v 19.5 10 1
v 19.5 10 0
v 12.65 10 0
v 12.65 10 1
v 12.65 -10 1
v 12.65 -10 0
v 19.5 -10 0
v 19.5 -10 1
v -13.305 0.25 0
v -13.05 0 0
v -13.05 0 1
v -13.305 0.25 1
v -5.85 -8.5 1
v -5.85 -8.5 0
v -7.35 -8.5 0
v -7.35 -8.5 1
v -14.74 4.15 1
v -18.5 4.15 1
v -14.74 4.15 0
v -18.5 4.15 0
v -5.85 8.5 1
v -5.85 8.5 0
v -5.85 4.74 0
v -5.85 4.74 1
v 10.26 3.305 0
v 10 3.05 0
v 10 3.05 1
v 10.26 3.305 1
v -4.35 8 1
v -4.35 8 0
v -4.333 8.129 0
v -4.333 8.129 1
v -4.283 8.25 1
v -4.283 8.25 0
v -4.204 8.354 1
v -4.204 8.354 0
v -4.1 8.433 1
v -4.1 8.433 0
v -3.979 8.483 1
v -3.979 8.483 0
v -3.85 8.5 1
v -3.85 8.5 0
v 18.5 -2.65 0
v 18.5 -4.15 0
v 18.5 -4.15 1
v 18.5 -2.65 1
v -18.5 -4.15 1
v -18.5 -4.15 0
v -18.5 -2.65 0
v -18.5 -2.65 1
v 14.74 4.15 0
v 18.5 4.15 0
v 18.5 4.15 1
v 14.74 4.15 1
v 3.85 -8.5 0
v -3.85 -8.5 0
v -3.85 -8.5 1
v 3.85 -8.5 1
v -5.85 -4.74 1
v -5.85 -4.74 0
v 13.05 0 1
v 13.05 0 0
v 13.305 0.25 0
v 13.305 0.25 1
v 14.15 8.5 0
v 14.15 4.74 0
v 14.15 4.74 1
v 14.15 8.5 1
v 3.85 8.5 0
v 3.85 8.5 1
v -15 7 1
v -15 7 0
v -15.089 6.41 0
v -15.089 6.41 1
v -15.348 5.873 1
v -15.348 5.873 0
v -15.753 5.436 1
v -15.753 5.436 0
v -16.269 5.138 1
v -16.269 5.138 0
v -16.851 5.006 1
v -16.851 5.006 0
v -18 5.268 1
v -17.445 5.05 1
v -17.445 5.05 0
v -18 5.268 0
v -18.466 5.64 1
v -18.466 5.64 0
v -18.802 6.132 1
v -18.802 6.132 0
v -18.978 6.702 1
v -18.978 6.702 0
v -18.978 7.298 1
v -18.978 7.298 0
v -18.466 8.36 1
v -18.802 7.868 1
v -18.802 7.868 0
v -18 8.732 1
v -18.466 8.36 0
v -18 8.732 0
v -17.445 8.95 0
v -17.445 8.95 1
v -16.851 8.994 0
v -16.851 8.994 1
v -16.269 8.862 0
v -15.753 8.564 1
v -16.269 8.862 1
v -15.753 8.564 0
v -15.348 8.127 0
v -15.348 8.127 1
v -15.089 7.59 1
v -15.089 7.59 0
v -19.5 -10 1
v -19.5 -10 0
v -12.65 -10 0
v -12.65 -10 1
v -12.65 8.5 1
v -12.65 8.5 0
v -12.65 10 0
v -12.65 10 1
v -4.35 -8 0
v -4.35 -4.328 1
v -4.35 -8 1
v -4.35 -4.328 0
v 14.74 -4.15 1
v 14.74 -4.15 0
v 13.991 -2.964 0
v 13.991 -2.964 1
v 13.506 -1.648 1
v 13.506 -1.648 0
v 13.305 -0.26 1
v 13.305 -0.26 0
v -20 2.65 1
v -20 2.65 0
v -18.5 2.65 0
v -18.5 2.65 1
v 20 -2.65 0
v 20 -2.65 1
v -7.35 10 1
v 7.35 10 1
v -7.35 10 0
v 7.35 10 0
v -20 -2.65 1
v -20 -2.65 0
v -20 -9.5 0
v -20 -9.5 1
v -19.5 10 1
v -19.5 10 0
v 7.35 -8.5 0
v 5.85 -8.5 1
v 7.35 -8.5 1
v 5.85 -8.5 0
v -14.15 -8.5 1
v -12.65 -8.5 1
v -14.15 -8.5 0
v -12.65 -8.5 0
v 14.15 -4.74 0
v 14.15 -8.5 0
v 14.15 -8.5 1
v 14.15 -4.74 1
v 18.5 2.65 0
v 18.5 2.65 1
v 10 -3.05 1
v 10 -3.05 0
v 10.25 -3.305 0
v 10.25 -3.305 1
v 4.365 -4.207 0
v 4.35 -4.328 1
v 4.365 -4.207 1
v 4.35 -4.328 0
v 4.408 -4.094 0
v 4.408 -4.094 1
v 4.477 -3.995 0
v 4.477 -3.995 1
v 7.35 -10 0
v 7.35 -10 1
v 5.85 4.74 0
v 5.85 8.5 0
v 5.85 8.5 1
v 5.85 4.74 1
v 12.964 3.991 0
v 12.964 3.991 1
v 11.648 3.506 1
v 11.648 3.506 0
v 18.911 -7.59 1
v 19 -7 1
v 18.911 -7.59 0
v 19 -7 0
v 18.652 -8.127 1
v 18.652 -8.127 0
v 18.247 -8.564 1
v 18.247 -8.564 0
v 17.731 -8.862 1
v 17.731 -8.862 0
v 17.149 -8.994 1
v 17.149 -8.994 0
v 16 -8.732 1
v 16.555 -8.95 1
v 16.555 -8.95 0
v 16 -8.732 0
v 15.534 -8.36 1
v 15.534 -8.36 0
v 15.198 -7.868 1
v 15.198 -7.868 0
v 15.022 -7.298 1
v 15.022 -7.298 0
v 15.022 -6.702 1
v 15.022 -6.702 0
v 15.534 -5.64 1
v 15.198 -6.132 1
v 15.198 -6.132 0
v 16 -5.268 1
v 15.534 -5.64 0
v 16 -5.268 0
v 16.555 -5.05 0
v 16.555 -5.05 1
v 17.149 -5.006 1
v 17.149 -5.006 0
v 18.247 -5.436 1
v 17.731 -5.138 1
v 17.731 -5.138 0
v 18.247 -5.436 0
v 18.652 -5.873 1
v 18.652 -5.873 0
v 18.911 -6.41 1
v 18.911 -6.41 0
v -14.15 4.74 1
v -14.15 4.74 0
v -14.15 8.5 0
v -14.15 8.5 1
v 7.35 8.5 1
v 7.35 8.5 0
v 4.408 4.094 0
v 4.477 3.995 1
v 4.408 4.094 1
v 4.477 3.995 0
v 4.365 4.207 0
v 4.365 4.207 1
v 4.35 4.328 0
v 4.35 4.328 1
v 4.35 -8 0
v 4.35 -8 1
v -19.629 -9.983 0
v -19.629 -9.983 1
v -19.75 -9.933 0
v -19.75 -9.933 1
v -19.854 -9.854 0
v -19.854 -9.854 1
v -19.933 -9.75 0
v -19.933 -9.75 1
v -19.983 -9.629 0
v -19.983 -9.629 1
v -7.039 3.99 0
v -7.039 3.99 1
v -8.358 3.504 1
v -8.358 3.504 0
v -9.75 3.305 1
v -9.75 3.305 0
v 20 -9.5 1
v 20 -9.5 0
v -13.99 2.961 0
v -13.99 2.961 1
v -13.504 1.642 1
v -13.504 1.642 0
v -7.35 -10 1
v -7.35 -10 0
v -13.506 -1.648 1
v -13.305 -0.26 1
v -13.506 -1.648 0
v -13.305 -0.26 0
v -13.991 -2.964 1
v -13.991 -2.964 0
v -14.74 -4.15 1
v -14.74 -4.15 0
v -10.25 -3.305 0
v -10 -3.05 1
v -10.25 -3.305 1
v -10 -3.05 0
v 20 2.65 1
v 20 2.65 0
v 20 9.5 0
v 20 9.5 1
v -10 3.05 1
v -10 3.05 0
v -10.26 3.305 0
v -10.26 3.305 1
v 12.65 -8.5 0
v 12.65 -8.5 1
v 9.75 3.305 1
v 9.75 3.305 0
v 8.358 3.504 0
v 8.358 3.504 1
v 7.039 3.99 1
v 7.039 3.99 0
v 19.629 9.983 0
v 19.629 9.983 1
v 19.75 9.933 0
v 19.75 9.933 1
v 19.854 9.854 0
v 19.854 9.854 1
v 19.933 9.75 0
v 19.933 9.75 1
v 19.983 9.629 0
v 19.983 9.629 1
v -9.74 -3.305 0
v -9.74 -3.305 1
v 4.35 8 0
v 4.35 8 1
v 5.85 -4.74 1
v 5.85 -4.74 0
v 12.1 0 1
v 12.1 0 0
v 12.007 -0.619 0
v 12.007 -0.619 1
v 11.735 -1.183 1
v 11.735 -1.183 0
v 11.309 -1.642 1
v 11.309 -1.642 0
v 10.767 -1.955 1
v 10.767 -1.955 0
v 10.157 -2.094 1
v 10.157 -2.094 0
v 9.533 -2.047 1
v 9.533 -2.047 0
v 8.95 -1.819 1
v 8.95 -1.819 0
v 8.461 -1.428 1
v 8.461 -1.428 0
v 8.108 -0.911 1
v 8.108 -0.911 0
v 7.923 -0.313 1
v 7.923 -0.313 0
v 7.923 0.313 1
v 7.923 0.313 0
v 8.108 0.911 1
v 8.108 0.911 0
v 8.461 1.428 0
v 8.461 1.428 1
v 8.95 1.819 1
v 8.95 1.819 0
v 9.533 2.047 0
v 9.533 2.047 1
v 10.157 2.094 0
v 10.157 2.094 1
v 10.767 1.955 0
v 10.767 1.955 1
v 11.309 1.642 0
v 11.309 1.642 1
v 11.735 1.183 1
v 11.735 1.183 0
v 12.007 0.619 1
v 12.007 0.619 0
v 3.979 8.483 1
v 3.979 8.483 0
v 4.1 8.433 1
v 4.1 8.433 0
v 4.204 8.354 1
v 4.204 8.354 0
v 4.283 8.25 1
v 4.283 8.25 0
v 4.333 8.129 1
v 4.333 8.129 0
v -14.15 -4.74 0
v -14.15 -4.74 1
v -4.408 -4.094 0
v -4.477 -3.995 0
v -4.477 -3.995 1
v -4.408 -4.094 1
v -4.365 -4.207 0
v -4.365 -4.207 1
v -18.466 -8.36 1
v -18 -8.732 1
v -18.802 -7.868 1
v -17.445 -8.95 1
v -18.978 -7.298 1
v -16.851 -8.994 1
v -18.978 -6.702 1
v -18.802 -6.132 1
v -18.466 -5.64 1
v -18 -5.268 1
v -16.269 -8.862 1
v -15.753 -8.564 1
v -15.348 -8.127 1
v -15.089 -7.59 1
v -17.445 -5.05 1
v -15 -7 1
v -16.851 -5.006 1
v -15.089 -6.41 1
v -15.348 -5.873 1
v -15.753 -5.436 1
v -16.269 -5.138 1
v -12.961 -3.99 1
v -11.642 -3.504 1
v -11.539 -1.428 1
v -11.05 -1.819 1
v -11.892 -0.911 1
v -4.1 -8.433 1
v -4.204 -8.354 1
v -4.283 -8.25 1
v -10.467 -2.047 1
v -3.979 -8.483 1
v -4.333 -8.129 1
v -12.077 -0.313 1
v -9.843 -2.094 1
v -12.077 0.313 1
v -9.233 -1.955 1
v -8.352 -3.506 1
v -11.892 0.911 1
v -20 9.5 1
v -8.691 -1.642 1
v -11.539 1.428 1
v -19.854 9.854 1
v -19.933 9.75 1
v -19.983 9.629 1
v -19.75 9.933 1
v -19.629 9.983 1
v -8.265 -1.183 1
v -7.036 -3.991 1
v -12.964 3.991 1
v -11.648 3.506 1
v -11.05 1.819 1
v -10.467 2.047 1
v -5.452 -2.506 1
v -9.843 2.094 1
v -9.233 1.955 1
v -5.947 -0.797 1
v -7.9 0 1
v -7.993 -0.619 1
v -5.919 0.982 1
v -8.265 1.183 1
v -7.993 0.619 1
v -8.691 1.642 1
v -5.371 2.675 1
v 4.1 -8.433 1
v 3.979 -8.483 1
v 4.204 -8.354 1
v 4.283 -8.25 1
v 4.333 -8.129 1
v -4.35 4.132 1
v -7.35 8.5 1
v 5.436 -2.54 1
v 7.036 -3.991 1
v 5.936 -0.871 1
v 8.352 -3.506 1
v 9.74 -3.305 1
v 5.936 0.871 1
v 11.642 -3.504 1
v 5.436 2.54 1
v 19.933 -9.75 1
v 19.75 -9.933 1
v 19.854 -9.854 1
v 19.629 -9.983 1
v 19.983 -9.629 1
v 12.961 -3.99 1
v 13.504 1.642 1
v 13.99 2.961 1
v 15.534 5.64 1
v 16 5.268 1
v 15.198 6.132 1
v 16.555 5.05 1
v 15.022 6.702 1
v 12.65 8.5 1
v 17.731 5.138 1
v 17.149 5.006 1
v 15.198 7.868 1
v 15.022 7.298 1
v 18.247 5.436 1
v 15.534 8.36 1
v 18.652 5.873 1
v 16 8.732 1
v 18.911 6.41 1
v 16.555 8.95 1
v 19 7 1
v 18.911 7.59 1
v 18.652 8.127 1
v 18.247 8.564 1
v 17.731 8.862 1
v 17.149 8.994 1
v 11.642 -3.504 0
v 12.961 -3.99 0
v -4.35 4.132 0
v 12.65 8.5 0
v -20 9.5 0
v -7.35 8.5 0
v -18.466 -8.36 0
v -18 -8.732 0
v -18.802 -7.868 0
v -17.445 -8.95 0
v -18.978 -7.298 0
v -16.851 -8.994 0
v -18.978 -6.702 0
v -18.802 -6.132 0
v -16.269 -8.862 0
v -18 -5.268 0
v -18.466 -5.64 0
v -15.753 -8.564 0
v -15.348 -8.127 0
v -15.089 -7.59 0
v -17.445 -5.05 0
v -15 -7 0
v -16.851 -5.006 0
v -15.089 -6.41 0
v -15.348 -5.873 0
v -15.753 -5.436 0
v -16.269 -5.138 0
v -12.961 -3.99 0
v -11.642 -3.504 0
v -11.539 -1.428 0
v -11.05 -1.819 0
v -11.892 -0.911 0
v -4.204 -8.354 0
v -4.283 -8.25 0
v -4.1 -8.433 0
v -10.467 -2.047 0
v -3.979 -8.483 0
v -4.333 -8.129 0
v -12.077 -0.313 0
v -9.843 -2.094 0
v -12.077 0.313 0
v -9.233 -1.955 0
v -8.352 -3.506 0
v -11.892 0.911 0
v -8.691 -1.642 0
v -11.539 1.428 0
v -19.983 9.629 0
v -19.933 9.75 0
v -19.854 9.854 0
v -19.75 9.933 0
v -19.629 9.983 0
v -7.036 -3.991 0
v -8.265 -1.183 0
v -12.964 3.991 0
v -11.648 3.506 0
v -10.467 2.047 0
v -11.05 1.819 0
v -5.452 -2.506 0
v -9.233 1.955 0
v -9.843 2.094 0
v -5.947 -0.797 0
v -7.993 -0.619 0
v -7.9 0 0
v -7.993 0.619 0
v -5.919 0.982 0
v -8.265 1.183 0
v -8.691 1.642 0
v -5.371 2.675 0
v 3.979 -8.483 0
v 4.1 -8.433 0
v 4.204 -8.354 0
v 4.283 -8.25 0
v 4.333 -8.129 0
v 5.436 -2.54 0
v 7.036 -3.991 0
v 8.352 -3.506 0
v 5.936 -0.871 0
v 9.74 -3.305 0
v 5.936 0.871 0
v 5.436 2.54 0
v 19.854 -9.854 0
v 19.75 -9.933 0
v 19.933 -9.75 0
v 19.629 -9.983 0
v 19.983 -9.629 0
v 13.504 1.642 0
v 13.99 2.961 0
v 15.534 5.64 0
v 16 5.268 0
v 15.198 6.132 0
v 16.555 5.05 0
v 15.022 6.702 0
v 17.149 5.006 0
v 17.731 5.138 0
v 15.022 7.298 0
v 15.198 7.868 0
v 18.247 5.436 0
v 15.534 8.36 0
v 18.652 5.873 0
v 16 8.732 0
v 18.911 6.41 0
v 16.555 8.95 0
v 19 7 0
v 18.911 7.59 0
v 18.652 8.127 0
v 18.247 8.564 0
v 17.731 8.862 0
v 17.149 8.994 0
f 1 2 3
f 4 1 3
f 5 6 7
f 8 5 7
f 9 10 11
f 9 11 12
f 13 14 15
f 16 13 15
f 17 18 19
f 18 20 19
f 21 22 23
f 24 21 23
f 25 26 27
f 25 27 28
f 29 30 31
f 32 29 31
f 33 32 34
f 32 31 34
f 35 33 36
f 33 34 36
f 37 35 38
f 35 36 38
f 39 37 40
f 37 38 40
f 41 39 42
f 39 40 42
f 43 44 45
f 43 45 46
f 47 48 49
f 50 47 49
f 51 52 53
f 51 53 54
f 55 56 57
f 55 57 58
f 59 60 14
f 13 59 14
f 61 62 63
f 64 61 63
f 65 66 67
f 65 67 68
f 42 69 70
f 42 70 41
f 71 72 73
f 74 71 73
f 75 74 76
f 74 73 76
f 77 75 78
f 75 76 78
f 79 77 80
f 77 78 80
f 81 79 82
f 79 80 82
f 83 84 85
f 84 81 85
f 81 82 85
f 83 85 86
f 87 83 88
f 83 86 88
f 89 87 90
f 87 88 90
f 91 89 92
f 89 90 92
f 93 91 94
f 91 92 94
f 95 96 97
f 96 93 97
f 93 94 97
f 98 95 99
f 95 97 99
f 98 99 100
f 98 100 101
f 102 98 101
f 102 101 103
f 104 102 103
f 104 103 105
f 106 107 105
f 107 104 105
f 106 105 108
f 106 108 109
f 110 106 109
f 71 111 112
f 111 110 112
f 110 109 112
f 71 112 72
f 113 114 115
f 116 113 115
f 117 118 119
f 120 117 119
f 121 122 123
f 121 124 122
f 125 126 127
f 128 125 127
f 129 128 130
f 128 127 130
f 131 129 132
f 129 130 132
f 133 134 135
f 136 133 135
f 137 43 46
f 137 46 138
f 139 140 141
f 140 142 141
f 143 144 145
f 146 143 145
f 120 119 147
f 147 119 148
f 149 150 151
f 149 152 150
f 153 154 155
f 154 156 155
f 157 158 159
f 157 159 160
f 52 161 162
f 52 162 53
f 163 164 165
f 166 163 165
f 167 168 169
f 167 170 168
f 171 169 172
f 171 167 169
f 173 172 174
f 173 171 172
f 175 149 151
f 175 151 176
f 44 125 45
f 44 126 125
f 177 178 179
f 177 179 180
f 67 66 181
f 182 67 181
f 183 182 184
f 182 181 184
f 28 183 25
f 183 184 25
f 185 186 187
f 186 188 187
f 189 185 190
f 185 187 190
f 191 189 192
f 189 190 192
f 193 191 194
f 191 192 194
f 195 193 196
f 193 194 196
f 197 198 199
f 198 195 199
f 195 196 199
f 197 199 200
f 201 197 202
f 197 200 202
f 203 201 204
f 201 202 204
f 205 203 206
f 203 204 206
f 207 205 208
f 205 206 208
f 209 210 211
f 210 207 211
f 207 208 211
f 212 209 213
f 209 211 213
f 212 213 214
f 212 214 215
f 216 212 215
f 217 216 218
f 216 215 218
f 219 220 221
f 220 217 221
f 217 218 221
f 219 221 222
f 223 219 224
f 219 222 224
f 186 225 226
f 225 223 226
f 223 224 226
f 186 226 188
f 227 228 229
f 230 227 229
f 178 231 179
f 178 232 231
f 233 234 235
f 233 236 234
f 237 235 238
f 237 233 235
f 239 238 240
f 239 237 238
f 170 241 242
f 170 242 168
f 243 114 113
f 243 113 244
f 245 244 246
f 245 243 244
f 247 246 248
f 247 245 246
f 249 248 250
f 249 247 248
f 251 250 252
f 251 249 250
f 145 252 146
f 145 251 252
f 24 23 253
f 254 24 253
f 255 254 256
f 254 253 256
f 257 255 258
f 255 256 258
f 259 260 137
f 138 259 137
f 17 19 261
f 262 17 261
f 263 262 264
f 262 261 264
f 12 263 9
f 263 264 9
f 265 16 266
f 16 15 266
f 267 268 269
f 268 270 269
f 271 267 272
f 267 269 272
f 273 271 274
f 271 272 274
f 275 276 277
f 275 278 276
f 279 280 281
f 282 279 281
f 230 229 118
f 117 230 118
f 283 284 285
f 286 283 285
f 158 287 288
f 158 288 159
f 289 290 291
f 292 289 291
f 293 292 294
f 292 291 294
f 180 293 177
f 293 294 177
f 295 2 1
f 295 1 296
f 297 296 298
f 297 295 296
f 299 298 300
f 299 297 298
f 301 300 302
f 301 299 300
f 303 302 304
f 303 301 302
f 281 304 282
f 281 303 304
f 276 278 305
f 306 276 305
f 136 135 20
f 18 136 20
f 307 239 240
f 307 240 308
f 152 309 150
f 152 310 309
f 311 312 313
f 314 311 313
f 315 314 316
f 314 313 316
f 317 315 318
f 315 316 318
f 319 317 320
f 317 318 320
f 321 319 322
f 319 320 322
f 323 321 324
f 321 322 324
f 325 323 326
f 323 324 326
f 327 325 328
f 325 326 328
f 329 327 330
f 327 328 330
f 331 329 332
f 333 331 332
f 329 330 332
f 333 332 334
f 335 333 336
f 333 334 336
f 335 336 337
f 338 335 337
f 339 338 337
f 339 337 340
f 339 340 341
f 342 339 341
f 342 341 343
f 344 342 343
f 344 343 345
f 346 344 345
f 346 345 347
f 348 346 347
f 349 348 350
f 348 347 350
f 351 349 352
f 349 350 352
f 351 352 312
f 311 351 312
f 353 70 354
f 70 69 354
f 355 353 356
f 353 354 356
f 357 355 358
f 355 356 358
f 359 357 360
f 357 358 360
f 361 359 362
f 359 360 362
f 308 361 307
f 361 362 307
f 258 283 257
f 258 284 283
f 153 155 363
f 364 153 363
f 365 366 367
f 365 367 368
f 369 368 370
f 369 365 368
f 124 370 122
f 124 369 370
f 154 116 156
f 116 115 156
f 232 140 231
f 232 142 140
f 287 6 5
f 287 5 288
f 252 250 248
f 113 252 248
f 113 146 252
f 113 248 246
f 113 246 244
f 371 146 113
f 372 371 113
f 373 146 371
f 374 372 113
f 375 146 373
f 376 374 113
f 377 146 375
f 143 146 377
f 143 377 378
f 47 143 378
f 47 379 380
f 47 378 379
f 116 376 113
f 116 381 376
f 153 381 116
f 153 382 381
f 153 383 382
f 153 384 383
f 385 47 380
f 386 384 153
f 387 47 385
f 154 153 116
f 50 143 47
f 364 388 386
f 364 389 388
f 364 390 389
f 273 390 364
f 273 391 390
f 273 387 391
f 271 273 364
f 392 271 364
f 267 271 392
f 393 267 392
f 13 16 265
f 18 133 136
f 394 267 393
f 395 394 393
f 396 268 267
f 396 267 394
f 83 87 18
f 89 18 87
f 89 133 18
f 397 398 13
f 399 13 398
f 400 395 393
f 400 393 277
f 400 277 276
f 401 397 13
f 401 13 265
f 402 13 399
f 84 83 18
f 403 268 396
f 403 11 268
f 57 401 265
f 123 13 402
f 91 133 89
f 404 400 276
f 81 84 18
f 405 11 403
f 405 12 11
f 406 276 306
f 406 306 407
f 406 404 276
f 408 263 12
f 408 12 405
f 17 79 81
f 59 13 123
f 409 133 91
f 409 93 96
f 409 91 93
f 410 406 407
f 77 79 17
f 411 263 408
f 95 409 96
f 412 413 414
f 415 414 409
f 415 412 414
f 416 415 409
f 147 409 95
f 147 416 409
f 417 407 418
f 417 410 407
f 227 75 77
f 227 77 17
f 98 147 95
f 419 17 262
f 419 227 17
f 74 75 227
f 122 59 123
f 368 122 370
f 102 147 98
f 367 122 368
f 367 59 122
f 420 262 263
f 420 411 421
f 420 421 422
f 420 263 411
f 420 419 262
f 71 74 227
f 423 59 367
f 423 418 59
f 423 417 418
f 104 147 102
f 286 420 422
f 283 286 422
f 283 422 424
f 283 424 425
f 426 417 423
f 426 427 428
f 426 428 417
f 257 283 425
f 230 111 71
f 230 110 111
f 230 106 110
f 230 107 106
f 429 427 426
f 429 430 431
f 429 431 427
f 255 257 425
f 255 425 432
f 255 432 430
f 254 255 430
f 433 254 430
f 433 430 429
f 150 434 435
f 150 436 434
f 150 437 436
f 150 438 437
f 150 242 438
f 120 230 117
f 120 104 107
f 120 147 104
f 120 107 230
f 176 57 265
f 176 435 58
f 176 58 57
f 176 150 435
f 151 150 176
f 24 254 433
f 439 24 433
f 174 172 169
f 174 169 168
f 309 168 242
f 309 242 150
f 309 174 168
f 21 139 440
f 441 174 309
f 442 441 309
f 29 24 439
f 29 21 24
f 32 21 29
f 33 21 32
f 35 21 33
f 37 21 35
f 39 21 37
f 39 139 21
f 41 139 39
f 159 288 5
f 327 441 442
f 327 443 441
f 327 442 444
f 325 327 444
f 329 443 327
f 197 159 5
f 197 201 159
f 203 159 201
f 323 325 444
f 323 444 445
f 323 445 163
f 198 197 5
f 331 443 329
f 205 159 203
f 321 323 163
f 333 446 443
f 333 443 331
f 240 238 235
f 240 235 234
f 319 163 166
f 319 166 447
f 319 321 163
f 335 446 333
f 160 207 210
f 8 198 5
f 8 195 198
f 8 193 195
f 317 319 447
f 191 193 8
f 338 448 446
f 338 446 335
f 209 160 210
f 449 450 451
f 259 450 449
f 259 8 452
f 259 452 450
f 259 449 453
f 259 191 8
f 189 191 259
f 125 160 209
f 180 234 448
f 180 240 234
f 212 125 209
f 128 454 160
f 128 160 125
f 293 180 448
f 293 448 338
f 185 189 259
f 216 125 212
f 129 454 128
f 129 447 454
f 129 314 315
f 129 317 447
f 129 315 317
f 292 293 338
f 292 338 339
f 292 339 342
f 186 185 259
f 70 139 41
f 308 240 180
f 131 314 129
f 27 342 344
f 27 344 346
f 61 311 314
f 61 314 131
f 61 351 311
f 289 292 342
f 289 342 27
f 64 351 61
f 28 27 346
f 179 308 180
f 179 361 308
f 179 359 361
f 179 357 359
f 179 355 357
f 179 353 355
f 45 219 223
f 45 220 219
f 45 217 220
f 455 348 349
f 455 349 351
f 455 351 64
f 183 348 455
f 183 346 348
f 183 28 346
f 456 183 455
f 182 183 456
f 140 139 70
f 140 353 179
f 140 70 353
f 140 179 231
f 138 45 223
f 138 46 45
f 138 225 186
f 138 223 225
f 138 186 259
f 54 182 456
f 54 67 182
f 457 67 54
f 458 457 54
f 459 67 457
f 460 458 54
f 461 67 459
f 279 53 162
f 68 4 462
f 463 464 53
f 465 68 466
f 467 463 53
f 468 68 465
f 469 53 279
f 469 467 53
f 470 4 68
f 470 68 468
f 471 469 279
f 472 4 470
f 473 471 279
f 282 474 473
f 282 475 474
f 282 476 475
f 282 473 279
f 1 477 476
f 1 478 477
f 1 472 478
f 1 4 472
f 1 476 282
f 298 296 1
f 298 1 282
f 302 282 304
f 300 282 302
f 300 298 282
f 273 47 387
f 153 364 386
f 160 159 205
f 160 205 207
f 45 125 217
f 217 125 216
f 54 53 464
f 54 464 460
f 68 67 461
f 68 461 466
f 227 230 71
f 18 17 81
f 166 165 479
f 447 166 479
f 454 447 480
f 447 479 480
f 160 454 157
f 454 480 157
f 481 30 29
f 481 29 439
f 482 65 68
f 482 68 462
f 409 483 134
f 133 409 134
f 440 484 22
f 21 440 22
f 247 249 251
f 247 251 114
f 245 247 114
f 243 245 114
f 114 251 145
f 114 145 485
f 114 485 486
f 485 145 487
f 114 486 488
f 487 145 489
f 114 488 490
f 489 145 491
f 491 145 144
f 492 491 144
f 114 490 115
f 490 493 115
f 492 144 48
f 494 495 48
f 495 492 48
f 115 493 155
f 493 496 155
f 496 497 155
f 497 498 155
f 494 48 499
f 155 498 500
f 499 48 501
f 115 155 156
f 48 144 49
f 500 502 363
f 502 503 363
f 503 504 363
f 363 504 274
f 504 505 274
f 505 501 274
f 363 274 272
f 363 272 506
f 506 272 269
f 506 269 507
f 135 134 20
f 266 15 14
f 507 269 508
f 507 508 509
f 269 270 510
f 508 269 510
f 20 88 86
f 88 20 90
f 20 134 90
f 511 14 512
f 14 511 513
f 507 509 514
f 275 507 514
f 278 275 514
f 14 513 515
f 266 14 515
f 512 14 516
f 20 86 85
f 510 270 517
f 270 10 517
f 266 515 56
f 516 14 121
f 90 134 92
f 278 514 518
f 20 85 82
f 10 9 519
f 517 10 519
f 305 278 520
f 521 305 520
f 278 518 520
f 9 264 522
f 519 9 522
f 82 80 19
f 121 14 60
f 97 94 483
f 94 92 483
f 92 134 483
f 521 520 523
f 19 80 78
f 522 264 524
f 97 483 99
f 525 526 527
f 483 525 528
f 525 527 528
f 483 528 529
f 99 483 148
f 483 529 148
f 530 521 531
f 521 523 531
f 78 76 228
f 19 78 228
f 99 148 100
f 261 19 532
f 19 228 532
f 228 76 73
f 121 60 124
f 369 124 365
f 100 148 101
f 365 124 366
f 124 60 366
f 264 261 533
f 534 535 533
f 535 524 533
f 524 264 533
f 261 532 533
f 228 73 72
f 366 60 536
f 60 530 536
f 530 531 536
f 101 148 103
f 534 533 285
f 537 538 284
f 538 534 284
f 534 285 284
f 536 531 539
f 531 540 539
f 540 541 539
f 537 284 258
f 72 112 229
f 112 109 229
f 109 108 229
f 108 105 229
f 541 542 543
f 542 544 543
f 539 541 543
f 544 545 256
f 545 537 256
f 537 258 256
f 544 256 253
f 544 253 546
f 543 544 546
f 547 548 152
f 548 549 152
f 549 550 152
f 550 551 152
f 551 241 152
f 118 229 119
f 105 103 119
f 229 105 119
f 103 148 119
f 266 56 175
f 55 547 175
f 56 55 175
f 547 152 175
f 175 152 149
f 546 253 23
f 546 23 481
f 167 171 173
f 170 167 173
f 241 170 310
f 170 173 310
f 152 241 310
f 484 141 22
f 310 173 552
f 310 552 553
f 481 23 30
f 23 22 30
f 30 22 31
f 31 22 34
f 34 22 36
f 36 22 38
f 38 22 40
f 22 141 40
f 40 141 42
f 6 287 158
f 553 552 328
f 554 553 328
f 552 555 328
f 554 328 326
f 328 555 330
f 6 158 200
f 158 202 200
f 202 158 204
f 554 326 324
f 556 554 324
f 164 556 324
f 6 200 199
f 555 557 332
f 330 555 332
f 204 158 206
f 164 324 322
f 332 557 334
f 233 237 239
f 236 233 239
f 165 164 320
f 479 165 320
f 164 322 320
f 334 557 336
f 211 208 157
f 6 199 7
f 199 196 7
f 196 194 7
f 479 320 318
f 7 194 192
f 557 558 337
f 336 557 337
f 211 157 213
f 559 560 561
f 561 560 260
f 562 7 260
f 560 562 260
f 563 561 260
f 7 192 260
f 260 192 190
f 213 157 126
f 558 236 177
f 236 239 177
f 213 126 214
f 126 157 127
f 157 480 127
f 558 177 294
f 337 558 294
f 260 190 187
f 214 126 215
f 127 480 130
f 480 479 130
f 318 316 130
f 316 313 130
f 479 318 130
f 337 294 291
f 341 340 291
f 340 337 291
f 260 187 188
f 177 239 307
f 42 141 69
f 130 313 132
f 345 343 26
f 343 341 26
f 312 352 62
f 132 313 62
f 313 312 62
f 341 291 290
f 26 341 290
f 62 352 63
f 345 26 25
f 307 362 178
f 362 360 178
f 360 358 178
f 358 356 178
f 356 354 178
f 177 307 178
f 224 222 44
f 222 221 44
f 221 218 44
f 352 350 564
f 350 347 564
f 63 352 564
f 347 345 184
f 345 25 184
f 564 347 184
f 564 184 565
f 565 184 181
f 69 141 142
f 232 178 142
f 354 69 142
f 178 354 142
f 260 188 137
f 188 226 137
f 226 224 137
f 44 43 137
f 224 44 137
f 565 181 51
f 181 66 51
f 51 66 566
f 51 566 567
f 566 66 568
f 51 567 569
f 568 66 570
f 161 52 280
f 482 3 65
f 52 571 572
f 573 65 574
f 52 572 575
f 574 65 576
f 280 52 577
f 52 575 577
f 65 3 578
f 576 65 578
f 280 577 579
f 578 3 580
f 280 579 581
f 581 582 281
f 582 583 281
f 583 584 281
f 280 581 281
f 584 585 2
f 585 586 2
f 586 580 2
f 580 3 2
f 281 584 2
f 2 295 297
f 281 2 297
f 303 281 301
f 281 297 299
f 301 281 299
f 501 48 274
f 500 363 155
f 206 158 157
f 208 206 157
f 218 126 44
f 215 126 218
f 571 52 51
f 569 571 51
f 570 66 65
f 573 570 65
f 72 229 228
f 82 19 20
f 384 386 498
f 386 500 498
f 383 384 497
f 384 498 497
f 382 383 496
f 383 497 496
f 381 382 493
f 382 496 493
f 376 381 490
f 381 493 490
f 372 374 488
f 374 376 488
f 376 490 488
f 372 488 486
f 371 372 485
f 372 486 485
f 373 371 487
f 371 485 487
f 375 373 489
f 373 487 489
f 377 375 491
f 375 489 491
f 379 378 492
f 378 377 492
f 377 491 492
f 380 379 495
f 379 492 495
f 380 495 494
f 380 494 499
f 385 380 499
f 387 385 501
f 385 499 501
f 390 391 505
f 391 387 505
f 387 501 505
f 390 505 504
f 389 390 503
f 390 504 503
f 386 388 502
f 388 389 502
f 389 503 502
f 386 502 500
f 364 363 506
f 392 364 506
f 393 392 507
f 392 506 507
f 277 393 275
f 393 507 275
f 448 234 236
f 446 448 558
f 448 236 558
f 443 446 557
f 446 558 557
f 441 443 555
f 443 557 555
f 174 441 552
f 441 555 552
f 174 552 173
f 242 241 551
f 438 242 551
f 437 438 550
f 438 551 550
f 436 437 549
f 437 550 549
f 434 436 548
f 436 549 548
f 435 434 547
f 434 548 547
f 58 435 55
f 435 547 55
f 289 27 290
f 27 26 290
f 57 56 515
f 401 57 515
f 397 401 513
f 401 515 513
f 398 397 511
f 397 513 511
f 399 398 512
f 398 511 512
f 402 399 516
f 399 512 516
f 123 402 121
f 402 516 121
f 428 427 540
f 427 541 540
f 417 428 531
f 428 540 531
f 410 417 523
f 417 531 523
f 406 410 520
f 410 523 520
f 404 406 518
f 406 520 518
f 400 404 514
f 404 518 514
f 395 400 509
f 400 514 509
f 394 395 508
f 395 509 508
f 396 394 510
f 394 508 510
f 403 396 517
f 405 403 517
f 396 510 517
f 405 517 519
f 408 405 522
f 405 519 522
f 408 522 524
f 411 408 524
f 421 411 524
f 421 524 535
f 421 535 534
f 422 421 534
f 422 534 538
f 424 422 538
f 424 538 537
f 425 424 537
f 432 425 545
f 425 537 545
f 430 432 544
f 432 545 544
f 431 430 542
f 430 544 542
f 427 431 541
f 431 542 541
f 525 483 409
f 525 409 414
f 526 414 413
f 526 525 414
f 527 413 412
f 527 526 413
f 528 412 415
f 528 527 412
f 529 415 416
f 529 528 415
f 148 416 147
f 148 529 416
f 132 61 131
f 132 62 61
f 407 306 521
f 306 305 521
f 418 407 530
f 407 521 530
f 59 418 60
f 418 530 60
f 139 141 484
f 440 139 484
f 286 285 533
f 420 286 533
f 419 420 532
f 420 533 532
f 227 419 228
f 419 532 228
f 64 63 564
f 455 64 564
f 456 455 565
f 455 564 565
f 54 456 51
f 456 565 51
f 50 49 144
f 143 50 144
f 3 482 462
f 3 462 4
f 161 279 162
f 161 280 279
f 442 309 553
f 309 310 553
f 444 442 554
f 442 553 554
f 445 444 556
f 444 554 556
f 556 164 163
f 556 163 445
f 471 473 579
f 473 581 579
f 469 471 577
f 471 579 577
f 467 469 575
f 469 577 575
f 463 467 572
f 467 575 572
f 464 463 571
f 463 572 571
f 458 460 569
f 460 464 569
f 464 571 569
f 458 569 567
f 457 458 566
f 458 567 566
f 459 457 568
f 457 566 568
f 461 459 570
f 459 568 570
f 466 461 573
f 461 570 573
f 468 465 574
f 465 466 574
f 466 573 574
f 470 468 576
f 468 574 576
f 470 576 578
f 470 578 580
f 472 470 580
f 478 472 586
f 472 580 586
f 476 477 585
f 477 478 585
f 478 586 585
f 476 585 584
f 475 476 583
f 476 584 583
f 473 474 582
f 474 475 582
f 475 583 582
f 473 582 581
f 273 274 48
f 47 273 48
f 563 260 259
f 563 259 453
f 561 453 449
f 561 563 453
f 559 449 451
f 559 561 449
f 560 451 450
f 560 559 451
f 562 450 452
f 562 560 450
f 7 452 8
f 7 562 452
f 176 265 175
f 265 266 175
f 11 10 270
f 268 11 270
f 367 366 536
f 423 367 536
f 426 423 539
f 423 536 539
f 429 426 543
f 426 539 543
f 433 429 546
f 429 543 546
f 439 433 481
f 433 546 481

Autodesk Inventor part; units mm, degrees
ref_plane "YZ Plane" through (0, 0, 0) normal (1, 0, 0) x (0, 1, 0)
ref_plane "XZ Plane" through (0, 0, 0) normal (0, 1, 0) x (-1, 0, 0)
ref_plane "XY Plane" through (0, 0, 0) normal (0, 0, 1) x (1, 0, 0)
sketch "스케치1" plane through (0, 0, 0) normal (0, 0, 1) x (1, 0, 0)
  line L0 (-19.5, -10) -> (19.5, -10)
  line L1 (20, -9.5) -> (20, 9.5)
  line L2 (19.5, 10) -> (-19.5, 10)
  line L3 (-20, 9.5) -> (-20, -9.5)
  circle A0 centre (-17, 7) radius 2
  line L4 (0, -12.143) -> (0, 11.1651)
  line L5 (28.9925, 0) -> (-24.8769, 0)
  circle A1 centre (-10, 0) radius 2.1
  line L6 (-10, 12.7543) -> (-10, -12.5913)
  line L7 (10, -12.5913) -> (10, 12.7543)
  circle A2 centre (10, 0) radius 2.1
  line L8 (-12.65, -10) -> (-12.65, -8.5)
  line L9 (-12.65, -8.5) -> (-14.15, -8.5)
  line L10 (-14.15, -8.5) -> (-14.15, -4.7403)
  line L11 (-5.85, -4.7397) -> (-5.85, -8.5)
  line L12 (-5.85, -8.5) -> (-7.35, -8.5)
  line L13 (-7.35, -8.5) -> (-7.35, -10)
  arc A3 (-5.85, -4.7397) -> (-14.15, -4.7403) centre (-9.9996, -10) ccw
  line L14 (-10, -3.05) -> (-10.25, -3.3047)
  line L15 (-10, -3.05) -> (-9.7398, -3.305)
  line L16 (12.65, -10) -> (12.65, -8.5)
  line L17 (12.65, -8.5) -> (14.15, -8.5)
  line L18 (14.15, -8.5) -> (14.15, -4.7403)
  line L19 (5.85, -4.7397) -> (5.85, -8.5)
  line L20 (5.85, -8.5) -> (7.35, -8.5)
  line L21 (7.35, -8.5) -> (7.35, -10)
  arc A4 (14.15, -4.7403) -> (5.85, -4.7397) centre (9.9996, -10) ccw
  line L22 (10, -3.05) -> (10.25, -3.3047)
  line L23 (10, -3.05) -> (9.7398, -3.305)
  line L24 (-20, 2.65) -> (-18.5, 2.65)
  line L25 (-18.5, 2.65) -> (-18.5, 4.15)
  line L26 (-18.5, 4.15) -> (-14.7403, 4.15)
  line L27 (-14.7397, -4.15) -> (-18.5, -4.15)
  line L28 (-18.5, -4.15) -> (-18.5, -2.65)
  line L29 (-18.5, -2.65) -> (-20, -2.65)
  line L30 (-13.05, 0) -> (-13.305, -0.2602)
  line L31 (-13.05, 0) -> (-13.3047, 0.25)
  arc A5 (-14.7397, -4.15) -> (-14.7403, 4.15) centre (-20, -0.0004) ccw
  line L32 (-7.35, 10) -> (-7.35, 8.5)
  line L33 (-7.35, 8.5) -> (-5.85, 8.5)
  line L34 (-5.85, 8.5) -> (-5.85, 4.7403)
  line L35 (-14.15, 4.7397) -> (-14.15, 8.5)
  line L36 (-14.15, 8.5) -> (-12.65, 8.5)
  line L37 (-12.65, 8.5) -> (-12.65, 10)
  line L38 (-10, 3.05) -> (-10.2602, 3.305)
  line L39 (-10, 3.05) -> (-9.75, 3.3047)
  arc A6 (-14.15, 4.7397) -> (-5.85, 4.7403) centre (-10.0004, 10) ccw
  line L40 (14.7397, -4.15) -> (18.5, -4.15)
  line L41 (18.5, -4.15) -> (18.5, -2.65)
  line L42 (18.5, -2.65) -> (20, -2.65)
  arc A7 (14.7403, 4.15) -> (14.7397, -4.15) centre (20, -0.0004) ccw
  line L43 (20, 2.65) -> (18.5, 2.65)
  line L44 (18.5, 2.65) -> (18.5, 4.15)
  line L45 (18.5, 4.15) -> (14.7403, 4.15)
  line L46 (13.05, 0) -> (13.305, -0.2602)
  line L47 (13.05, 0) -> (13.3047, 0.25)
  line L48 (14.15, 4.7397) -> (14.15, 8.5)
  line L49 (14.15, 8.5) -> (12.65, 8.5)
  line L50 (12.65, 8.5) -> (12.65, 10)
  arc A8 (5.85, 4.7403) -> (14.15, 4.7397) centre (10.0004, 10) ccw
  line L51 (7.35, 10) -> (7.35, 8.5)
  line L52 (7.35, 8.5) -> (5.85, 8.5)
  line L53 (5.85, 8.5) -> (5.85, 4.7403)
  line L54 (10, 3.05) -> (10.2602, 3.305)
  line L55 (10, 3.05) -> (9.75, 3.3047)
  circle A9 centre (-17, -7) radius 2
  circle A10 centre (17, 7) radius 2
  circle A11 centre (17, -7) radius 2
  line L56 (-3.85, -8.5) -> (3.85, -8.5)
  line L57 (3.85, 8.5) -> (-3.85, 8.5)
  line L58 (-4.35, -8.5) -> (4.35, 8.5) construction
  line L59 (4.35, -8.5) -> (-4.35, 8.5) construction
  arc A12 (-3.85, 8.5) -> (-4.35, 8) centre (-3.85, 8) ccw
  arc A13 (4.35, 8) -> (3.85, 8.5) centre (3.85, 8) ccw
  arc A14 (3.85, -8.5) -> (4.35, -8) centre (3.85, -8) ccw
  arc A15 (-4.35, -8) -> (-3.85, -8.5) centre (-3.85, -8) ccw
  line L60 (-4.35, 8) -> (-4.35, 4.1325)
  line L61 (-4.35, -4.3275) -> (-4.35, -8)
  line L62 (4.35, -8) -> (4.35, -4.3275)
  line L63 (4.35, 4.3275) -> (4.35, 8)
  arc A16 (4.4769, -3.9946) -> (4.4769, 3.9946) centre (0, 0) ccw
  arc A17 (-4.35, 4.1325) -> (-4.4769, -3.9946) centre (0, 0) ccw
  arc A18 (-4.35, -4.3275) -> (-4.4769, -3.9946) centre (-4.85, -4.3275) ccw
  arc A19 (4.35, 4.3275) -> (4.4769, 3.9946) centre (4.85, 4.3275) ccw
  arc A20 (4.4769, -3.9946) -> (4.35, -4.3275) centre (4.85, -4.3275) ccw
  arc A21 (-19.5, 10) -> (-20, 9.5) centre (-19.5, 9.5) ccw
  arc A22 (-20, -9.5) -> (-19.5, -10) centre (-19.5, -9.5) ccw
  arc A23 (19.5, -10) -> (20, -9.5) centre (19.5, -9.5) ccw
  arc A24 (20, 9.5) -> (19.5, 10) centre (19.5, 9.5) ccw
  point P0 (20, 10)
  point P1 (20, -10)
  point P2 (-20, 10)
  point P3 (-14.15, -6.6202)
  point P4 (-12.65, -9.25)
  point P5 (-10.0001, -3.3)
  point P6 (14.15, -6.6202)
  point P7 (12.65, -9.25)
  point P8 (10.0001, -3.3)
  point P9 (-19.25, 2.65)
  point P10 (-16.6202, 4.15)
  point P11 (-13.3, 0.0001)
  point P12 (-7.35, 9.25)
  point P13 (-5.85, 6.6202)
  point P14 (-9.9999, 3.3)
  point P15 (13.3, 0.0001)
  point P16 (19.25, 2.65)
  point P17 (16.6202, 4.15)
  point P18 (22.5913, 0)
  point P19 (9.9999, 3.3)
  point P20 (7.35, 9.25)
  point P21 (5.85, 6.6202)
  point P22 (10, 12.5913)
  point P23 (-5.85, -6.6199)
  point P24 (-4.35, -4.1325)
  point P25 (4.35, -4.1325)
  point P26 (4.35, 4.1325)
  point P27 (4.35, 6.1638)
  point P28 (-4.35, 6.0662)
  dimension "d0" = 40
  dimension "d1" = 20
  dimension "d2" = 4
  dimension "d3" = 34
  dimension "d4" = 14
  dimension "d5" = 4.2
  dimension "d6" = 20
  dimension "d8" = 4.2
  dimension "d9" = 20
  dimension "d12" = 1.5
  dimension "d13" = 6.7
  dimension "d14" = 8.3
  dimension "d15" = 5.3
  dimension "d16" = 5.3
  dimension "d17" = 8.3
  dimension "d18" = 6.7
  dimension "d19" = 0.5
  dimension "d20" = 0.25
  dimension "d23" = 180
  dimension "d27" = 180
  dimension "d29" = 1.5
  dimension "d31" = 1.5
  dimension "d32" = 0.5
  dimension "d33" = 0.5
  dimension "d34" = 0.5
  dimension "d35" = 8.7
extrude "돌출1" add sketch "스케치1" along normal blind 1 contours A22 L3 L29 L28 L27 A5 L30 L5 A1 L6 L14 A3 L10 L9 L8 L0 | L13 L12 L11 A3 L15 L6 A1 L5 A17 A18 L61 A15 L56 L4 L0 | L4 L56 A14 L62 A20 A16 L5 A2 L7 L23 A4 L19 L20 L21 L0 | L3 A21 L2 L37 L36 L35 A6 L38 L6 A1 L5 L31 A5 L26 L25 L24 | A1 L6 L39 A6 L34 L33 L32 L2 L4 L57 A12 L60 A17 L5 | L16 L17 L18 A4 L22 L7 A2 L5 L46 A7 L40 L41 L42 L1 A23 L0 | L4 L2 L51 L52 L53 A8 L55 L7 A2 L5 A16 A19 L63 A13 L57 | L7 L54 A8 L48 L49 L50 L2 A24 L1 L43 L44 L45 A7 L47 L5 A2
equation "\"d8\" = d5"
properties part number "20x40 profile"
